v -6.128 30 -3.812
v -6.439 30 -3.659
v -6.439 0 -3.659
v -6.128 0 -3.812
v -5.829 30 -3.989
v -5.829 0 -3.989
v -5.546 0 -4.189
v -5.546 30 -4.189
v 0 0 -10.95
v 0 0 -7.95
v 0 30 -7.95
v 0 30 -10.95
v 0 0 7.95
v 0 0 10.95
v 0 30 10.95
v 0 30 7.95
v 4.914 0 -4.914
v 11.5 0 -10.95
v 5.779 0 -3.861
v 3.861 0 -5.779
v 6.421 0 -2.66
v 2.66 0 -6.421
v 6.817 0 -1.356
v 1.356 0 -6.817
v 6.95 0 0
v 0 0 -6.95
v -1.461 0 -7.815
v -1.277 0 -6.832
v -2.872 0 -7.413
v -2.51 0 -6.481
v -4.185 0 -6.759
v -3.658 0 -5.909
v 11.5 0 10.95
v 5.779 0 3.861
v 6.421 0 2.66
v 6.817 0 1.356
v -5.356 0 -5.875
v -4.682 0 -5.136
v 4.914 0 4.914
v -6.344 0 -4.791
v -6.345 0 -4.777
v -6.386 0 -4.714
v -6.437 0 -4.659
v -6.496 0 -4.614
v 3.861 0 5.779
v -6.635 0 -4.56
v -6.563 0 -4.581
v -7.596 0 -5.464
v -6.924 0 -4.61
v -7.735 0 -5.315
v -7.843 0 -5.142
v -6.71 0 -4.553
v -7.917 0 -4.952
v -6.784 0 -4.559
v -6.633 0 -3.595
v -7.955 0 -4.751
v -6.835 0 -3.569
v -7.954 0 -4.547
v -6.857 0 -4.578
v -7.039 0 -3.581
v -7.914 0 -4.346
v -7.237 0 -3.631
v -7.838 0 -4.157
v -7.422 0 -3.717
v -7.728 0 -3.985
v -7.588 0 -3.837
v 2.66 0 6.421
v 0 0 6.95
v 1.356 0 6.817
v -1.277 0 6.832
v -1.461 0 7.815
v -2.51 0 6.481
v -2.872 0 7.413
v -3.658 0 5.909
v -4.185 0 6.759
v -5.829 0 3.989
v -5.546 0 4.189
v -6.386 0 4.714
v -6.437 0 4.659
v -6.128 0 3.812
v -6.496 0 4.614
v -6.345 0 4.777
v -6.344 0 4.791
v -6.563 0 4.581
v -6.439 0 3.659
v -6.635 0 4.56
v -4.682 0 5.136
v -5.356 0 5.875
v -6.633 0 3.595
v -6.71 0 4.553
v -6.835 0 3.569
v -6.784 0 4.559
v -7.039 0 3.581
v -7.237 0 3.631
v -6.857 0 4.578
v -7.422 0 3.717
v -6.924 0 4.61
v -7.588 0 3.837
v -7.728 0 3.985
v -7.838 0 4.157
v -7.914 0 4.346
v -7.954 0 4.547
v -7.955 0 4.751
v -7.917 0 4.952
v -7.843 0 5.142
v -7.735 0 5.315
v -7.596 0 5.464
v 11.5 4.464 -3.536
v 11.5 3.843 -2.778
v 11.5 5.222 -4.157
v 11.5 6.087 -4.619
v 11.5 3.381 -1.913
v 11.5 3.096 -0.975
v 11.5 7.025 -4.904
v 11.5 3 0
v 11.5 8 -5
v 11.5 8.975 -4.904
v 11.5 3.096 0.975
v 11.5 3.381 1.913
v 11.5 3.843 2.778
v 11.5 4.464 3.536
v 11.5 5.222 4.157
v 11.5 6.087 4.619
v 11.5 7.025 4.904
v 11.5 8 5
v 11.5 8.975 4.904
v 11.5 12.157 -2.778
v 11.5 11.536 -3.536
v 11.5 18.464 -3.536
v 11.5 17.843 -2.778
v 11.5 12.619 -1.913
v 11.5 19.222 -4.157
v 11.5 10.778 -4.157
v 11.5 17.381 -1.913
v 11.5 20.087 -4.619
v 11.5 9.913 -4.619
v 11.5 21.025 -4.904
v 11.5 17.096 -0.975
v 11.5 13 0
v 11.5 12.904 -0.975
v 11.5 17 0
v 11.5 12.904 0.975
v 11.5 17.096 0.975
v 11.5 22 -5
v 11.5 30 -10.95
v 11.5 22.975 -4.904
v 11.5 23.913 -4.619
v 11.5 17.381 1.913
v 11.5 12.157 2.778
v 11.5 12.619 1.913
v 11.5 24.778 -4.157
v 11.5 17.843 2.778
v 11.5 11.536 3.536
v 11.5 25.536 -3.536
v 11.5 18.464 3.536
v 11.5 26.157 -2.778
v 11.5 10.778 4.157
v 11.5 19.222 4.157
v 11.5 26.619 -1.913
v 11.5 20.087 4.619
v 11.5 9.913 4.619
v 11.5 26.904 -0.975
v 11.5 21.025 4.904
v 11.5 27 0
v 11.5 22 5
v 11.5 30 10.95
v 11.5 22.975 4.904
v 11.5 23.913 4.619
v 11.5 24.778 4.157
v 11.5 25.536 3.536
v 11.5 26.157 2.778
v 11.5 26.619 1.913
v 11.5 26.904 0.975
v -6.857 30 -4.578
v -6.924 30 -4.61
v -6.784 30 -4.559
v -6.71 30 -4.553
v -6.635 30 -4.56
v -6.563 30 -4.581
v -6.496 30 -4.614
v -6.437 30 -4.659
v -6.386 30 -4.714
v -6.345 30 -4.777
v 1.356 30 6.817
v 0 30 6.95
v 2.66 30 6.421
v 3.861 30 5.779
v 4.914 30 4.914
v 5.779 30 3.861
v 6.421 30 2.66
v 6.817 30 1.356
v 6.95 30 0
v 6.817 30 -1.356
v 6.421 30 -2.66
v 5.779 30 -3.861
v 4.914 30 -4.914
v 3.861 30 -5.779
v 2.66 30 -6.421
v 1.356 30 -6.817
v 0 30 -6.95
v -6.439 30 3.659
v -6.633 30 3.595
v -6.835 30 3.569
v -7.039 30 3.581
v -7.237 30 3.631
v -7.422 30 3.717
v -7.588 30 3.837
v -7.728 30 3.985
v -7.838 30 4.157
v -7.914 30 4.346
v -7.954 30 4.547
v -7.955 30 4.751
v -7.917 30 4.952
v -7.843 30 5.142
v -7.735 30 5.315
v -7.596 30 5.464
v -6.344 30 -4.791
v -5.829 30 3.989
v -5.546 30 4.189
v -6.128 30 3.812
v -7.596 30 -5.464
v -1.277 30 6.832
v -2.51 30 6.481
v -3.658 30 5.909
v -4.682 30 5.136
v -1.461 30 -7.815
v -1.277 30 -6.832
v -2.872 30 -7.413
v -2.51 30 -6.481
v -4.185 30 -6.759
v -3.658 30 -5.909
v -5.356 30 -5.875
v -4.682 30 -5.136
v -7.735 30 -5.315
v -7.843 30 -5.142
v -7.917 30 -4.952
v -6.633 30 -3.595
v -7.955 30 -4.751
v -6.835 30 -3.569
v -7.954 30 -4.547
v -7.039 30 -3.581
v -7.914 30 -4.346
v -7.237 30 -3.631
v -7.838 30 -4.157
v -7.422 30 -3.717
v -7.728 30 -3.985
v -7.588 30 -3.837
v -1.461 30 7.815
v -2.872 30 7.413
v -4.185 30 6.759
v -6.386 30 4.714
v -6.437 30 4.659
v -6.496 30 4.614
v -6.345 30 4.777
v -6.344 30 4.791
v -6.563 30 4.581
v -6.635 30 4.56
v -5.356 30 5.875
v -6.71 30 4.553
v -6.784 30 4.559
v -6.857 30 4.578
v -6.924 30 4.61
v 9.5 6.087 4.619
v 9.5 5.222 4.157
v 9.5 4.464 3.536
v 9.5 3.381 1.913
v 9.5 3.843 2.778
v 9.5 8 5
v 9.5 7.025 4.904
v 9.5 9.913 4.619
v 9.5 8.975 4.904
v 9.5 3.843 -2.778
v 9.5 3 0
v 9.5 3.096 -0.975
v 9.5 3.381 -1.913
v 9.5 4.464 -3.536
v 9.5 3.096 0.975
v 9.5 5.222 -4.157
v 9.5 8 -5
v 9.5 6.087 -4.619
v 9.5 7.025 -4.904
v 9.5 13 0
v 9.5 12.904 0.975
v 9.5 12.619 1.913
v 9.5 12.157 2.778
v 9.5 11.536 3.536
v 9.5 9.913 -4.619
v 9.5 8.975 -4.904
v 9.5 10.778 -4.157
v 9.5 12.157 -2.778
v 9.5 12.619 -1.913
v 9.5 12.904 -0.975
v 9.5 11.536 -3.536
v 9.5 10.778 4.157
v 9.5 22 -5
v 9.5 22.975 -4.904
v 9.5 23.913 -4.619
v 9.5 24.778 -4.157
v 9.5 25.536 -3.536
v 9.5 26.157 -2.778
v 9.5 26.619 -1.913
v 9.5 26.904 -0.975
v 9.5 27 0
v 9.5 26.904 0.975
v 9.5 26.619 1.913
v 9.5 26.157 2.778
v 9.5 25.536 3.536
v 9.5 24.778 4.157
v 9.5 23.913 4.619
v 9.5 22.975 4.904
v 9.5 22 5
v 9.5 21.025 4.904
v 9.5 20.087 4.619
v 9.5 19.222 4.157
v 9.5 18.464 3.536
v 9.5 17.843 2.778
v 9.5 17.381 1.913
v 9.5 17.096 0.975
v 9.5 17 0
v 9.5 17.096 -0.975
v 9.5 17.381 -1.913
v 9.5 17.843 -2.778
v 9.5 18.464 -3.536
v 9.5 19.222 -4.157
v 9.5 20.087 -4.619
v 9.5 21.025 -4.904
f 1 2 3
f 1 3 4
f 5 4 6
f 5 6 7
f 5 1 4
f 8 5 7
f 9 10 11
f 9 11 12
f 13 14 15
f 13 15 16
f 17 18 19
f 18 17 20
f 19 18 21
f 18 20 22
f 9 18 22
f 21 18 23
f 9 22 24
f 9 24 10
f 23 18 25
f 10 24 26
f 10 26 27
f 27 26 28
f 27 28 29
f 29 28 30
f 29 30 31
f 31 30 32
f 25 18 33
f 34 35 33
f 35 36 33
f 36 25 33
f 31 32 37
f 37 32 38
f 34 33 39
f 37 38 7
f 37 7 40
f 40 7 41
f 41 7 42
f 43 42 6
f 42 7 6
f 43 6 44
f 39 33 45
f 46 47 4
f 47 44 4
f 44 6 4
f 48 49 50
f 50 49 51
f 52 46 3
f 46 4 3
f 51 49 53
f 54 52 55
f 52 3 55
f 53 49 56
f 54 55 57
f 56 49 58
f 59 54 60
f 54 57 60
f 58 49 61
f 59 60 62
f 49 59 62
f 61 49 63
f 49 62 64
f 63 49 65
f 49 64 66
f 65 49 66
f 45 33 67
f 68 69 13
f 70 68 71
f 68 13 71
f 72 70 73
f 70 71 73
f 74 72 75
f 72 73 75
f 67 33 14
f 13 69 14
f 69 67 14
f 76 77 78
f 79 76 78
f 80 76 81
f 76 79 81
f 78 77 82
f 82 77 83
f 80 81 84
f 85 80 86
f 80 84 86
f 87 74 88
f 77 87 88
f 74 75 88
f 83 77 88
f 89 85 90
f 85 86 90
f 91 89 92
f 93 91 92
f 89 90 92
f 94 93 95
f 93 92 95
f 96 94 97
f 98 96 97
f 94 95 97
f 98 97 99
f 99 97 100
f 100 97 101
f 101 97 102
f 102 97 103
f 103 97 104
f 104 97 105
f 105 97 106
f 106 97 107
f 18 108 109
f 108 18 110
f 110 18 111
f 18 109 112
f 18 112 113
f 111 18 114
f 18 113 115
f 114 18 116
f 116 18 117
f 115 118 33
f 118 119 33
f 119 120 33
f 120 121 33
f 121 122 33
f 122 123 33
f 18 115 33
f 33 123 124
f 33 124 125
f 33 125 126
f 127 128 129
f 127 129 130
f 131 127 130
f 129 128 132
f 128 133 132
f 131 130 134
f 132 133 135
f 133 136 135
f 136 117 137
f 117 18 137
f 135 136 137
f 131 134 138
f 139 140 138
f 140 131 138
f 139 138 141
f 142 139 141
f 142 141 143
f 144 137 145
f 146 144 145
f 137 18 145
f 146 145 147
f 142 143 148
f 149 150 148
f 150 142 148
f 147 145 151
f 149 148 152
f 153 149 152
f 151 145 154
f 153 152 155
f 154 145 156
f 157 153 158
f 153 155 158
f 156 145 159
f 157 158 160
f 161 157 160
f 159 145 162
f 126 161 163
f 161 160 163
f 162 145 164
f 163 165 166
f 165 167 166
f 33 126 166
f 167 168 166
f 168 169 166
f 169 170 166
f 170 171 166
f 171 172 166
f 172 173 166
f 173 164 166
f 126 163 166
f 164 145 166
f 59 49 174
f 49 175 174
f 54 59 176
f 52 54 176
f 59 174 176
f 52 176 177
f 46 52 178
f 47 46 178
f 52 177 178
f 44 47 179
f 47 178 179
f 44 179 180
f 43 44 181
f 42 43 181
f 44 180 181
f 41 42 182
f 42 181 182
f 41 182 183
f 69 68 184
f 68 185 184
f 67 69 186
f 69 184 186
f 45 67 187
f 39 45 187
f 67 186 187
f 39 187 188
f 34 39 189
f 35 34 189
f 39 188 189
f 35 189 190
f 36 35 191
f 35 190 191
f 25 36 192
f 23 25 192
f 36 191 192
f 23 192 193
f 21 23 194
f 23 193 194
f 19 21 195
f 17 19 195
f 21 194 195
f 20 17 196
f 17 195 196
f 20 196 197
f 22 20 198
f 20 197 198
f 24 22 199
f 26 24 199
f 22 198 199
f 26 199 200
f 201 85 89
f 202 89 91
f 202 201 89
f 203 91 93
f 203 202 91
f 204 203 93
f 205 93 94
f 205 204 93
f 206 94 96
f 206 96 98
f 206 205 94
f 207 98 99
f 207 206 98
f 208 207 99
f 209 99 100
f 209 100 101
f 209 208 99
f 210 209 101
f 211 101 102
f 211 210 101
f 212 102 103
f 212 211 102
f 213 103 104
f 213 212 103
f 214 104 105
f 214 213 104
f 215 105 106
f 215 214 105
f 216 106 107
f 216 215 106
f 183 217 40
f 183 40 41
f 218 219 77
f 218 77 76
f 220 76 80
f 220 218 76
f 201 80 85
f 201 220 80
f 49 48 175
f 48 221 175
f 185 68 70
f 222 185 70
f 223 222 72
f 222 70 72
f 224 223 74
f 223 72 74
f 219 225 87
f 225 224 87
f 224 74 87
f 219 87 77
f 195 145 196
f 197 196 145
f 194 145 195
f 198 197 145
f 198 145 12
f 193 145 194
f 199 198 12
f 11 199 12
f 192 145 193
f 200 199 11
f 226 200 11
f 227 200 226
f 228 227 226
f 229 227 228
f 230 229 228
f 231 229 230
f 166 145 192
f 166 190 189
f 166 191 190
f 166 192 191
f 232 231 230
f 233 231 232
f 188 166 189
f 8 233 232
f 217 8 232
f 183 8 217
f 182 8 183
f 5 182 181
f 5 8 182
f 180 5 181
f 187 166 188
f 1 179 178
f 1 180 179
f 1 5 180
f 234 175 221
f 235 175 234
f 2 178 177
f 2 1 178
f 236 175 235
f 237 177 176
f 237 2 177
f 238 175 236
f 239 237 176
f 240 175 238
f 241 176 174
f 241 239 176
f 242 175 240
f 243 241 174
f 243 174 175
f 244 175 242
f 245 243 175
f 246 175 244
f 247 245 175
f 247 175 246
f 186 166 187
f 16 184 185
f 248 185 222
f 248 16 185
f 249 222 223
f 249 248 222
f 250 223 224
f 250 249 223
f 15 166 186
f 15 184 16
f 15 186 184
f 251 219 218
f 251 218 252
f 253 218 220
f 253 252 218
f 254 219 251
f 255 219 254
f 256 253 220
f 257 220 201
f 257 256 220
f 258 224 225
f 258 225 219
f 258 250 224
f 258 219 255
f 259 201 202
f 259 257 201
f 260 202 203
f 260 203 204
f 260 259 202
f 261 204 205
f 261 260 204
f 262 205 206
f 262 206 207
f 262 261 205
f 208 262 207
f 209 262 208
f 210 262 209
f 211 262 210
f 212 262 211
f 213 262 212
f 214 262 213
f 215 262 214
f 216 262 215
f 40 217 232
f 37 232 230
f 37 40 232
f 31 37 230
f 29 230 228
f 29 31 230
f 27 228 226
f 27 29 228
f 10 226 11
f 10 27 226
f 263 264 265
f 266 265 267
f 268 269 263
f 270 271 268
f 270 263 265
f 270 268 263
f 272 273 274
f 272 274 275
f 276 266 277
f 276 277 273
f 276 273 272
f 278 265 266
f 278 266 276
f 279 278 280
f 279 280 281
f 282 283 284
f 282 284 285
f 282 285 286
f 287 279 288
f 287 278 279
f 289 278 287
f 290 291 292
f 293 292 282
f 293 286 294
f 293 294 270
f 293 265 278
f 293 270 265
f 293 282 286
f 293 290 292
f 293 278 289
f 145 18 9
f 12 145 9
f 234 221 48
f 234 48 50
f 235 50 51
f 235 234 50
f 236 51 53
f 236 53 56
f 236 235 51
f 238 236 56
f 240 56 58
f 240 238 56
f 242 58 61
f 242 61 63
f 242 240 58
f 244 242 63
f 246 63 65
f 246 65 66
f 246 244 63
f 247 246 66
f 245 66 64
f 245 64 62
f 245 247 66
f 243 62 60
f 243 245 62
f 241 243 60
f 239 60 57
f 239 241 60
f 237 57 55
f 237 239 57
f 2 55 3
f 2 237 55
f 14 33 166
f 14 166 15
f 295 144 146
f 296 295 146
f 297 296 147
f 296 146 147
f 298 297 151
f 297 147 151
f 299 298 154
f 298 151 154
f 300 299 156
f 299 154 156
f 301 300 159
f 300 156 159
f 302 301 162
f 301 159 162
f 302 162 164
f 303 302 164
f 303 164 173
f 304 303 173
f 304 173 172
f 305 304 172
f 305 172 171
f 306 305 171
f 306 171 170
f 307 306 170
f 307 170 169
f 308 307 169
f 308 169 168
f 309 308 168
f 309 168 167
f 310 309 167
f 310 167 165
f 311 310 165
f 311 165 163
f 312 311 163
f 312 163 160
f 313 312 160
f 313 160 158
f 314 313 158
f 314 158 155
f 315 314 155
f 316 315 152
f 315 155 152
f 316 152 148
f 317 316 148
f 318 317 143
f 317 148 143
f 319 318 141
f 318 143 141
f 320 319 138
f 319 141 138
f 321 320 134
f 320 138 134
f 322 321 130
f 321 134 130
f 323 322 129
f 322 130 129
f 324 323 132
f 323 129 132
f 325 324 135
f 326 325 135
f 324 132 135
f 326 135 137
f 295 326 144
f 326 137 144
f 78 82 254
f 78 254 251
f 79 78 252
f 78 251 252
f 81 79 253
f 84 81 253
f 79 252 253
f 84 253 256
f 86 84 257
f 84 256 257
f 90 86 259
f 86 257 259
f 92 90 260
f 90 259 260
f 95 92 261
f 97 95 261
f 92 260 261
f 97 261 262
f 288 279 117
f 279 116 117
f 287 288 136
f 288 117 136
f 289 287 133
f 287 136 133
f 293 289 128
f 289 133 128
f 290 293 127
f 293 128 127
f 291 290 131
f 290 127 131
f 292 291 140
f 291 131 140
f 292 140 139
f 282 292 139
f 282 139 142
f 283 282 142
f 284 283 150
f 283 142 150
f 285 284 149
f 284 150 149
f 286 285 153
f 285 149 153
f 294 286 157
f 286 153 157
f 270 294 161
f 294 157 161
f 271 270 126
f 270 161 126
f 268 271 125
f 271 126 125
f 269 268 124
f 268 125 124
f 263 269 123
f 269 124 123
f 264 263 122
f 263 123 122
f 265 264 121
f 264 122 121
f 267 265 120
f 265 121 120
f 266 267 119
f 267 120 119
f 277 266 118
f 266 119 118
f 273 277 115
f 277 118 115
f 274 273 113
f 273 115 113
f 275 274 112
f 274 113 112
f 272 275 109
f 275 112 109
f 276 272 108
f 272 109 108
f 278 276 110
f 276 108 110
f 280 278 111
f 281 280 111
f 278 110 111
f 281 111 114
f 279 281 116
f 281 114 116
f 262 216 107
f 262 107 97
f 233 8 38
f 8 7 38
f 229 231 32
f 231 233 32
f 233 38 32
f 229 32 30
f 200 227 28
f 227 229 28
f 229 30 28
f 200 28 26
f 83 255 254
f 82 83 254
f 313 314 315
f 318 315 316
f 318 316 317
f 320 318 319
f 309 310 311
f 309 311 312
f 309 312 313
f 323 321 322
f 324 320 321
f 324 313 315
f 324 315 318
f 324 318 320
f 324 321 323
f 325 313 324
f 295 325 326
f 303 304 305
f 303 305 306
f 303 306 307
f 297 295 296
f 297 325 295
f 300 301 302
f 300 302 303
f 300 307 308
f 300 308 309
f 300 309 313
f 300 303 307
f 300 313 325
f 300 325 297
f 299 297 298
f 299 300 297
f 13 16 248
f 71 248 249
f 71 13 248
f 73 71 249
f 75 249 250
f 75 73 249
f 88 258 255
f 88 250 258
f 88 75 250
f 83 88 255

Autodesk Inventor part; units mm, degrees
ref_plane "YZ Plane" through (0, 0, 0) normal (1, 0, 0) x (0, 1, 0)
ref_plane "XZ Plane" through (0, 0, 0) normal (0, 1, 0) x (-1, 0, 0)
ref_plane "XY Plane" through (0, 0, 0) normal (0, 0, 1) x (1, 0, 0)
sketch "Эскиз1" plane through (0, 0, 0) normal (0, 1, 0) x (-1, 0, 0)
  circle A0 centre (0, 0) radius 6.95
  circle A1 centre (0, 0) radius 7.95
  line L0 (0, 0) -> (6.3439, 4.7913)
  line L1 (0, 0) -> (6.3439, -4.7913)
  point P0 (5.546, -4.1887)
  point P1 (5.546, 4.1887)
  dimension "d0" = 13.9
  dimension "d1" = 15.9
extrude "Выдавливание1" add sketch "Эскиз1" along normal blind 30 contours A0 L1 A1 L0 picked at (-7.4629, 1.2262)
sketch "Эскиз2" plane through (0, 30, 0) normal (0, 1, 0) x (1, 0, 0)
  arc A0 (-5.546, -4.1887) -> (-6.4386, -3.6588) centre (-8.2473, -7.7226) ccw
  arc A1 (-6.4386, -3.6588) -> (-7.5956, -5.4645) centre (-6.873, -4.654) ccw
  line L0 (-7.5956, -5.4645) -> (-6.9243, -4.6101)
  arc A2 (-6.3454, -4.7768) -> (-6.9243, -4.6101) centre (-6.7137, -4.9672) ccw
  line L1 (-5.546, -4.1887) -> (-6.3439, -4.7913)
  line L2 (-6.3439, -4.7913) -> (-5.546, -4.1887)
  line L3 (-6.3439, -4.7913) -> (-6.3454, -4.7768)
  line L4 (-0.0151, 0) -> (-3.489, 0)
  arc A3 (-6.4386, 3.6588) -> (-5.546, 4.1887) centre (-8.2473, 7.7226) ccw
  arc A4 (-6.9243, 4.6101) -> (-6.3454, 4.7768) centre (-6.7137, 4.9672) ccw
  line L5 (-5.546, 4.1887) -> (-6.3439, 4.7913)
  line L6 (-6.3439, 4.7913) -> (-5.546, 4.1887)
  line L7 (-6.3439, 4.7913) -> (-6.3454, 4.7768)
  arc A5 (-7.5956, 5.4645) -> (-6.4386, 3.6588) centre (-6.873, 4.654) ccw
  line L8 (-7.5956, 5.4645) -> (-6.9243, 4.6101)
  point P0 (-5.546, 4.1887)
  point P1 (-6.3439, -4.7913)
  point P2 (-5.3694, -4.0591)
  point P3 (-6.3439, 4.7913)
  point P4 (-5.3694, 4.0591)
  point P5 (-6.3439, 4.7913)
  dimension "d25" = 1.0859
sketch "Эскиз3" plane through (0, 30, 0) normal (0, 1, 0) x (1, 0, 0)
  arc A0 (-6.3439, -4.7913) -> (-6.3439, 4.7913) centre (0, 0) ccw projected
  line L0 (11.5, -6.95) -> (11.5, 6.95)
  arc A1 (-5.546, -4.1887) -> (-5.546, 4.1887) centre (0, 0) ccw projected
  line L1 (0, -7.95) -> (0, -6.95)
  line L2 (0, 6.95) -> (0, 7.95)
  line L3 (11.5, 6.95) -> (11.5, 10.95)
  line L4 (11.5, -6.95) -> (11.5, -10.95)
  line L5 (0, 3.45) -> (0, 7.95)
  line L6 (11.5, -10.95) -> (0, -10.95)
  line L7 (0, -10.95) -> (0, -7.95)
  line L8 (11.5, 10.95) -> (0, 10.95)
  line L9 (0, 10.95) -> (0, 7.95)
  arc A2 (0, -6.95) -> (0, 6.95) centre (0, 0) ccw
  dimension "d13" = 4
  dimension "d14" = 4
  dimension "d22" = 21.9
  dimension "d23" = 4
extrude "Выдавливание3" add sketch "Эскиз3" against normal blind 30
ref_plane "РабПлоскость1" through (11.5, 20, 4.95) normal (1, 0, 0) x (0, 0, -1)
sketch "Эскиз4" plane through (11.5, 20, 4.95) normal (1, 0, 0) x (0, 0, -1)
  line L0 (4.95, -20) -> (4.95, 10)
  line L1 (1, 10) -> (8.9, 10) projected
  circle A0 centre (4.95, -12) radius 5
  line L2 (14.4, -20) -> (-4.5, -20) projected
  circle A1 centre (4.95, 2) radius 5
  line L3 (-4.5, 10) -> (14.4, 10) projected
  point P0 (7.3306, 10)
  point P1 (2.5694, 10)
  point P2 (4.95, 10)
  dimension "d15" = 10
  dimension "d16" = 8
  dimension "d17" = 10
  dimension "d18" = 8
extrude "Выдавливание4" cut sketch "Эскиз4" against normal blind 2
extrude "Выдавливание5" add sketch "Эскиз2" against normal blind 30
sketch "Эскиз5" plane through (0, 30, 0) normal (0, 1, 0) x (1, 0, 0)
  arc A0 (0, 7.95) -> (-6.3439, 4.7913) centre (0, 0) ccw projected
  line L0 (-6.3439, 4.7913) -> (-6.3454, 4.7768) projected
  arc A1 (-6.9243, 4.6101) -> (-6.3454, 4.7768) centre (-6.7137, 4.9672) ccw projected
  line L1 (-6.9243, 4.6101) -> (-7.5956, 5.4645) projected
  arc A2 (-7.5956, 5.4645) -> (-6.4386, 3.6588) centre (-6.873, 4.654) ccw projected
  arc A3 (-6.4386, 3.6588) -> (-5.546, 4.1887) centre (-8.2473, 7.7226) ccw projected
  arc A4 (-5.546, -4.1887) -> (-5.546, 4.1887) centre (0, 0) ccw projected
  arc A5 (-5.546, -4.1887) -> (-6.4386, -3.6588) centre (-8.2473, -7.7226) ccw projected
  arc A6 (-6.4386, -3.6588) -> (-7.5956, -5.4645) centre (-6.873, -4.654) ccw projected
  line L2 (-7.5956, -5.4645) -> (-6.9243, -4.6101) projected
  arc A7 (-6.3454, -4.7768) -> (-6.9243, -4.6101) centre (-6.7137, -4.9672) ccw projected
  line L3 (-6.3454, -4.7768) -> (-6.3439, -4.7913) projected
  arc A8 (-6.3439, -4.7913) -> (0, -7.95) centre (0, 0) ccw projected
  line L4 (0, -7.95) -> (0, -10.95) projected
  line L5 (0, -10.95) -> (11.5, -10.95) projected
  line L6 (11.5, -10.95) -> (11.5, 10.95) projected
  line L7 (11.5, 10.95) -> (0, 10.95) projected
  line L8 (0, 10.95) -> (0, 7.95) projected
  line L9 (0, 6.95) -> (0, 7.95)
  line L10 (0, -6.95) -> (0, -7.95)
extrude "Выдавливание6" [suppressed]
sketch "Эскиз6" plane through (11.5, 30, 10.95) normal (1, 0, 0) x (0, 0, -1)
  arc A0 (15.95, -22) -> (15.95, -22) centre (10.95, -22) ccw projected
  arc A1 (15.95, -8) -> (15.95, -8) centre (10.95, -8) ccw projected
  point P0 (10.95, -30)
extrude "Выдавливание7" [suppressed]
properties part number "крепление маркера 14мм"
